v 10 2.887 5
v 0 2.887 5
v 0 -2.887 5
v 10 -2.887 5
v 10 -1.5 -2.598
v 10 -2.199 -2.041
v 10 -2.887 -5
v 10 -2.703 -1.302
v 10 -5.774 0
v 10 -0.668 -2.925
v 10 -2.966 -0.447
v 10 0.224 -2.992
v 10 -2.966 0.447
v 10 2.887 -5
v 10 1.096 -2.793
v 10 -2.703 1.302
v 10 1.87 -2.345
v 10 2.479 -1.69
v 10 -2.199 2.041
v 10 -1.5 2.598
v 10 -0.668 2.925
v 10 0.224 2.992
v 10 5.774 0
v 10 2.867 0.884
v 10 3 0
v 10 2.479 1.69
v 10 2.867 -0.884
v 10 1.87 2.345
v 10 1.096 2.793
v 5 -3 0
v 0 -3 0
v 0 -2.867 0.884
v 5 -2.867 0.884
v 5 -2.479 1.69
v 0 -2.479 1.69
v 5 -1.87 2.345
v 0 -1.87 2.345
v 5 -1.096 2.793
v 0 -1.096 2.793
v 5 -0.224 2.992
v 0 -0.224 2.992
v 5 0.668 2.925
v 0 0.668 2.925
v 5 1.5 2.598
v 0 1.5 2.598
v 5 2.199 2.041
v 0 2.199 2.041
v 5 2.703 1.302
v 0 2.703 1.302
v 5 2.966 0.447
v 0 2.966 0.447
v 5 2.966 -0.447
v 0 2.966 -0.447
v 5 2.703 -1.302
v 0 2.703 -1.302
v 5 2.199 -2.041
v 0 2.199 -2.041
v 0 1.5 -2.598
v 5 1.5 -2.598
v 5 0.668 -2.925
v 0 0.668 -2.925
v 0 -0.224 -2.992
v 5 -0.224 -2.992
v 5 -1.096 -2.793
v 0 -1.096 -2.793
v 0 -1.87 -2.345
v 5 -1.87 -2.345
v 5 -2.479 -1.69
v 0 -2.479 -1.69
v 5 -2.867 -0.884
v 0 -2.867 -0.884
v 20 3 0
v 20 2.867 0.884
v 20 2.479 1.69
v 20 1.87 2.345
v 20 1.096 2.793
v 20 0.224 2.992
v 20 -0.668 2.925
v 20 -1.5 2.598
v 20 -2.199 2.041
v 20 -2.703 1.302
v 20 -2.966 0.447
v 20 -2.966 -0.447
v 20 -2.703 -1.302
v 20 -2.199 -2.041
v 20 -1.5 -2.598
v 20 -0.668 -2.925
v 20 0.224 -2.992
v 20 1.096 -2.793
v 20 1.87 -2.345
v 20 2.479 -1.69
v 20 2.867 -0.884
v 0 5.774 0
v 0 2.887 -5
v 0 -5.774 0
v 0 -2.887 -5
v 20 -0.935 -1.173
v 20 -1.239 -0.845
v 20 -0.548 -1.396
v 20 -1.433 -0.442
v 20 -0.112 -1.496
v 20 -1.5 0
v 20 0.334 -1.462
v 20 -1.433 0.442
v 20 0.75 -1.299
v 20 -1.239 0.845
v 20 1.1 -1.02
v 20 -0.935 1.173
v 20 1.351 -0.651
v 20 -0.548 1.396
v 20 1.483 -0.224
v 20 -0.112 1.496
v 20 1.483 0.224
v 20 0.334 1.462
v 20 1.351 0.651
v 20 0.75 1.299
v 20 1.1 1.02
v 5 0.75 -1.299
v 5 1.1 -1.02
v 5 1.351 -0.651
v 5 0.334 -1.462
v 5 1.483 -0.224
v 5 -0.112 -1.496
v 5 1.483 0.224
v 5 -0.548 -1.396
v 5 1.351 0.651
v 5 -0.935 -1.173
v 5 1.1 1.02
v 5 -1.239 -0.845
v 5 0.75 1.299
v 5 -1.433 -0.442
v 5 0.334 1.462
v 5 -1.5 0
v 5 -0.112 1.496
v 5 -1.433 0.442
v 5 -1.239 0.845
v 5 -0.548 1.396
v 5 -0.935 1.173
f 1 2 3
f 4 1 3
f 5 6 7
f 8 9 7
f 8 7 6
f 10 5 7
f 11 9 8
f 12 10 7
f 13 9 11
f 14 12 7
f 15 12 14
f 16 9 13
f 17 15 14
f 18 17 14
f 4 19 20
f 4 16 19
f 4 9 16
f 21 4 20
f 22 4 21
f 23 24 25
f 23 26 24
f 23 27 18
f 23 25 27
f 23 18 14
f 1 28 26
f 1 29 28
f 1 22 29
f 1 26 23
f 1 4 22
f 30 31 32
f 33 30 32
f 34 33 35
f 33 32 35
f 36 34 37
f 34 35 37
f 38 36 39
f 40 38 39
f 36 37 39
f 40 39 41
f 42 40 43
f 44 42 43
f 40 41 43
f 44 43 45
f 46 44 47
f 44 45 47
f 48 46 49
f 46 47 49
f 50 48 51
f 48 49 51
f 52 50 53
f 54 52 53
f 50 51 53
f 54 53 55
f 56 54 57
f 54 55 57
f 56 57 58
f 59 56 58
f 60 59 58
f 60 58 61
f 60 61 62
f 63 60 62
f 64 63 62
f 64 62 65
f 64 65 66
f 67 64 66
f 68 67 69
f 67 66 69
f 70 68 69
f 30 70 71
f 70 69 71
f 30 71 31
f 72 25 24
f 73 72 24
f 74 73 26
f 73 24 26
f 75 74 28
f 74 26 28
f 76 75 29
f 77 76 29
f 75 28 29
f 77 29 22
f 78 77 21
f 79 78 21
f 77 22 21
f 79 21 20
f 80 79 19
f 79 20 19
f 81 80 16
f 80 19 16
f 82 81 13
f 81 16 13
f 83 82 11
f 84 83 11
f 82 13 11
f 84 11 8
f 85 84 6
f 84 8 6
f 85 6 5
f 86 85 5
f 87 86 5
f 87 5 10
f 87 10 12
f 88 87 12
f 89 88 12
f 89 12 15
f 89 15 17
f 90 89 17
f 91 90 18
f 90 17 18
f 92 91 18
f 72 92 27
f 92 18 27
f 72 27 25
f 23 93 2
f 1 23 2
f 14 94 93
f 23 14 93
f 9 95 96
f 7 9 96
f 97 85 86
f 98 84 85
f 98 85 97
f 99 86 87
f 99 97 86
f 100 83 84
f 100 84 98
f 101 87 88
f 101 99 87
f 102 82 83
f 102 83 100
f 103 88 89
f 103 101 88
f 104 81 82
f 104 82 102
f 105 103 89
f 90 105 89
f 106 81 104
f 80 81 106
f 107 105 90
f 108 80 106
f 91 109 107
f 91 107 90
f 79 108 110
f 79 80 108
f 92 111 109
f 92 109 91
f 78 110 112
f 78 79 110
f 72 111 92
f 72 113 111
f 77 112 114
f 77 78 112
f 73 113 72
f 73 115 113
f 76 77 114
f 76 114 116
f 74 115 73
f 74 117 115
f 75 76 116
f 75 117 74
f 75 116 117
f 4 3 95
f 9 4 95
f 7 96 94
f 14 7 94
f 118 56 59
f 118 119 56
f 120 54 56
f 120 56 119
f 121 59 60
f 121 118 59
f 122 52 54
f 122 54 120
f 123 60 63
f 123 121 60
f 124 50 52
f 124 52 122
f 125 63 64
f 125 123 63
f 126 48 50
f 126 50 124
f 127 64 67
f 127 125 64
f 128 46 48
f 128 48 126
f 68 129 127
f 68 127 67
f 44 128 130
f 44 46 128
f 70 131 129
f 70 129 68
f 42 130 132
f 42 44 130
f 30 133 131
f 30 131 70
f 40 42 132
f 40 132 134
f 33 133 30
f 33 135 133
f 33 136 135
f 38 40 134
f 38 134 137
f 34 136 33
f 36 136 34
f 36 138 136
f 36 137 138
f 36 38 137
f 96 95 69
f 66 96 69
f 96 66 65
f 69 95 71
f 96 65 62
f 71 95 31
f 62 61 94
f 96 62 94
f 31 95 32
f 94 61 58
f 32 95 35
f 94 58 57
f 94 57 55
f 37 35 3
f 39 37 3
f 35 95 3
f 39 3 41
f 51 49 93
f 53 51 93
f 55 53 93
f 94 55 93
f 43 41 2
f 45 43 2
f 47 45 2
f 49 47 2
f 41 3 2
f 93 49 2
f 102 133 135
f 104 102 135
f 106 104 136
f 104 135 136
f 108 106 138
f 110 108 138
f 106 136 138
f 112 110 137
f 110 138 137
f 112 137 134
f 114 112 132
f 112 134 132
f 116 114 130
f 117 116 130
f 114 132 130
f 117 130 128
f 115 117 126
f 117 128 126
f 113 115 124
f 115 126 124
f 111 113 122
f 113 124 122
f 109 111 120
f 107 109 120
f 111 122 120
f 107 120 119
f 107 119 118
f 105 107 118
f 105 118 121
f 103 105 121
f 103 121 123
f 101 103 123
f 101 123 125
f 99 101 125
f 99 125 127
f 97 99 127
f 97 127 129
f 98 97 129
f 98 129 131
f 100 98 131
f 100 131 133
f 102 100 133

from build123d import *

# Parameters (mm, degrees)
F1_DEPTH = 10
F2_R     = 3
F3_DEPTH = 10
F4_R     = 1.5
F5_DEPTH = 25
F6_R     = 3
F7_DEPTH = 5


with BuildPart() as f1:
    # F0 (on Right) → F1 (new body)
    with BuildSketch(Plane.YZ):
        Polygon((2.886751, 5), (-2.886751, 5), (-5.773503, 0), (-2.886751, -5), (2.886751, -5), (5.773503, 0), align=None)
    extrude(amount=F1_DEPTH)

    # F2 (on face) → F3 (join)
    with BuildSketch(Plane.YZ.offset(10)):
        Circle(F2_R)
    extrude(amount=F3_DEPTH)

    # F4 (on face) → F5 (cut)
    with BuildSketch(Plane(origin=(0, 0, 0), x_dir=(0, -1, 0), z_dir=(-1, 0, 0))):
        Circle(F4_R)
    extrude(amount=-F5_DEPTH, mode=Mode.SUBTRACT)

    # F6 (on face) → F7 (cut)
    with BuildSketch(Plane(origin=(0, 0, 0), x_dir=(0, -1, 0), z_dir=(-1, 0, 0))):
        Circle(F6_R)
    extrude(amount=-F7_DEPTH, mode=Mode.SUBTRACT)


solid = f1.part
